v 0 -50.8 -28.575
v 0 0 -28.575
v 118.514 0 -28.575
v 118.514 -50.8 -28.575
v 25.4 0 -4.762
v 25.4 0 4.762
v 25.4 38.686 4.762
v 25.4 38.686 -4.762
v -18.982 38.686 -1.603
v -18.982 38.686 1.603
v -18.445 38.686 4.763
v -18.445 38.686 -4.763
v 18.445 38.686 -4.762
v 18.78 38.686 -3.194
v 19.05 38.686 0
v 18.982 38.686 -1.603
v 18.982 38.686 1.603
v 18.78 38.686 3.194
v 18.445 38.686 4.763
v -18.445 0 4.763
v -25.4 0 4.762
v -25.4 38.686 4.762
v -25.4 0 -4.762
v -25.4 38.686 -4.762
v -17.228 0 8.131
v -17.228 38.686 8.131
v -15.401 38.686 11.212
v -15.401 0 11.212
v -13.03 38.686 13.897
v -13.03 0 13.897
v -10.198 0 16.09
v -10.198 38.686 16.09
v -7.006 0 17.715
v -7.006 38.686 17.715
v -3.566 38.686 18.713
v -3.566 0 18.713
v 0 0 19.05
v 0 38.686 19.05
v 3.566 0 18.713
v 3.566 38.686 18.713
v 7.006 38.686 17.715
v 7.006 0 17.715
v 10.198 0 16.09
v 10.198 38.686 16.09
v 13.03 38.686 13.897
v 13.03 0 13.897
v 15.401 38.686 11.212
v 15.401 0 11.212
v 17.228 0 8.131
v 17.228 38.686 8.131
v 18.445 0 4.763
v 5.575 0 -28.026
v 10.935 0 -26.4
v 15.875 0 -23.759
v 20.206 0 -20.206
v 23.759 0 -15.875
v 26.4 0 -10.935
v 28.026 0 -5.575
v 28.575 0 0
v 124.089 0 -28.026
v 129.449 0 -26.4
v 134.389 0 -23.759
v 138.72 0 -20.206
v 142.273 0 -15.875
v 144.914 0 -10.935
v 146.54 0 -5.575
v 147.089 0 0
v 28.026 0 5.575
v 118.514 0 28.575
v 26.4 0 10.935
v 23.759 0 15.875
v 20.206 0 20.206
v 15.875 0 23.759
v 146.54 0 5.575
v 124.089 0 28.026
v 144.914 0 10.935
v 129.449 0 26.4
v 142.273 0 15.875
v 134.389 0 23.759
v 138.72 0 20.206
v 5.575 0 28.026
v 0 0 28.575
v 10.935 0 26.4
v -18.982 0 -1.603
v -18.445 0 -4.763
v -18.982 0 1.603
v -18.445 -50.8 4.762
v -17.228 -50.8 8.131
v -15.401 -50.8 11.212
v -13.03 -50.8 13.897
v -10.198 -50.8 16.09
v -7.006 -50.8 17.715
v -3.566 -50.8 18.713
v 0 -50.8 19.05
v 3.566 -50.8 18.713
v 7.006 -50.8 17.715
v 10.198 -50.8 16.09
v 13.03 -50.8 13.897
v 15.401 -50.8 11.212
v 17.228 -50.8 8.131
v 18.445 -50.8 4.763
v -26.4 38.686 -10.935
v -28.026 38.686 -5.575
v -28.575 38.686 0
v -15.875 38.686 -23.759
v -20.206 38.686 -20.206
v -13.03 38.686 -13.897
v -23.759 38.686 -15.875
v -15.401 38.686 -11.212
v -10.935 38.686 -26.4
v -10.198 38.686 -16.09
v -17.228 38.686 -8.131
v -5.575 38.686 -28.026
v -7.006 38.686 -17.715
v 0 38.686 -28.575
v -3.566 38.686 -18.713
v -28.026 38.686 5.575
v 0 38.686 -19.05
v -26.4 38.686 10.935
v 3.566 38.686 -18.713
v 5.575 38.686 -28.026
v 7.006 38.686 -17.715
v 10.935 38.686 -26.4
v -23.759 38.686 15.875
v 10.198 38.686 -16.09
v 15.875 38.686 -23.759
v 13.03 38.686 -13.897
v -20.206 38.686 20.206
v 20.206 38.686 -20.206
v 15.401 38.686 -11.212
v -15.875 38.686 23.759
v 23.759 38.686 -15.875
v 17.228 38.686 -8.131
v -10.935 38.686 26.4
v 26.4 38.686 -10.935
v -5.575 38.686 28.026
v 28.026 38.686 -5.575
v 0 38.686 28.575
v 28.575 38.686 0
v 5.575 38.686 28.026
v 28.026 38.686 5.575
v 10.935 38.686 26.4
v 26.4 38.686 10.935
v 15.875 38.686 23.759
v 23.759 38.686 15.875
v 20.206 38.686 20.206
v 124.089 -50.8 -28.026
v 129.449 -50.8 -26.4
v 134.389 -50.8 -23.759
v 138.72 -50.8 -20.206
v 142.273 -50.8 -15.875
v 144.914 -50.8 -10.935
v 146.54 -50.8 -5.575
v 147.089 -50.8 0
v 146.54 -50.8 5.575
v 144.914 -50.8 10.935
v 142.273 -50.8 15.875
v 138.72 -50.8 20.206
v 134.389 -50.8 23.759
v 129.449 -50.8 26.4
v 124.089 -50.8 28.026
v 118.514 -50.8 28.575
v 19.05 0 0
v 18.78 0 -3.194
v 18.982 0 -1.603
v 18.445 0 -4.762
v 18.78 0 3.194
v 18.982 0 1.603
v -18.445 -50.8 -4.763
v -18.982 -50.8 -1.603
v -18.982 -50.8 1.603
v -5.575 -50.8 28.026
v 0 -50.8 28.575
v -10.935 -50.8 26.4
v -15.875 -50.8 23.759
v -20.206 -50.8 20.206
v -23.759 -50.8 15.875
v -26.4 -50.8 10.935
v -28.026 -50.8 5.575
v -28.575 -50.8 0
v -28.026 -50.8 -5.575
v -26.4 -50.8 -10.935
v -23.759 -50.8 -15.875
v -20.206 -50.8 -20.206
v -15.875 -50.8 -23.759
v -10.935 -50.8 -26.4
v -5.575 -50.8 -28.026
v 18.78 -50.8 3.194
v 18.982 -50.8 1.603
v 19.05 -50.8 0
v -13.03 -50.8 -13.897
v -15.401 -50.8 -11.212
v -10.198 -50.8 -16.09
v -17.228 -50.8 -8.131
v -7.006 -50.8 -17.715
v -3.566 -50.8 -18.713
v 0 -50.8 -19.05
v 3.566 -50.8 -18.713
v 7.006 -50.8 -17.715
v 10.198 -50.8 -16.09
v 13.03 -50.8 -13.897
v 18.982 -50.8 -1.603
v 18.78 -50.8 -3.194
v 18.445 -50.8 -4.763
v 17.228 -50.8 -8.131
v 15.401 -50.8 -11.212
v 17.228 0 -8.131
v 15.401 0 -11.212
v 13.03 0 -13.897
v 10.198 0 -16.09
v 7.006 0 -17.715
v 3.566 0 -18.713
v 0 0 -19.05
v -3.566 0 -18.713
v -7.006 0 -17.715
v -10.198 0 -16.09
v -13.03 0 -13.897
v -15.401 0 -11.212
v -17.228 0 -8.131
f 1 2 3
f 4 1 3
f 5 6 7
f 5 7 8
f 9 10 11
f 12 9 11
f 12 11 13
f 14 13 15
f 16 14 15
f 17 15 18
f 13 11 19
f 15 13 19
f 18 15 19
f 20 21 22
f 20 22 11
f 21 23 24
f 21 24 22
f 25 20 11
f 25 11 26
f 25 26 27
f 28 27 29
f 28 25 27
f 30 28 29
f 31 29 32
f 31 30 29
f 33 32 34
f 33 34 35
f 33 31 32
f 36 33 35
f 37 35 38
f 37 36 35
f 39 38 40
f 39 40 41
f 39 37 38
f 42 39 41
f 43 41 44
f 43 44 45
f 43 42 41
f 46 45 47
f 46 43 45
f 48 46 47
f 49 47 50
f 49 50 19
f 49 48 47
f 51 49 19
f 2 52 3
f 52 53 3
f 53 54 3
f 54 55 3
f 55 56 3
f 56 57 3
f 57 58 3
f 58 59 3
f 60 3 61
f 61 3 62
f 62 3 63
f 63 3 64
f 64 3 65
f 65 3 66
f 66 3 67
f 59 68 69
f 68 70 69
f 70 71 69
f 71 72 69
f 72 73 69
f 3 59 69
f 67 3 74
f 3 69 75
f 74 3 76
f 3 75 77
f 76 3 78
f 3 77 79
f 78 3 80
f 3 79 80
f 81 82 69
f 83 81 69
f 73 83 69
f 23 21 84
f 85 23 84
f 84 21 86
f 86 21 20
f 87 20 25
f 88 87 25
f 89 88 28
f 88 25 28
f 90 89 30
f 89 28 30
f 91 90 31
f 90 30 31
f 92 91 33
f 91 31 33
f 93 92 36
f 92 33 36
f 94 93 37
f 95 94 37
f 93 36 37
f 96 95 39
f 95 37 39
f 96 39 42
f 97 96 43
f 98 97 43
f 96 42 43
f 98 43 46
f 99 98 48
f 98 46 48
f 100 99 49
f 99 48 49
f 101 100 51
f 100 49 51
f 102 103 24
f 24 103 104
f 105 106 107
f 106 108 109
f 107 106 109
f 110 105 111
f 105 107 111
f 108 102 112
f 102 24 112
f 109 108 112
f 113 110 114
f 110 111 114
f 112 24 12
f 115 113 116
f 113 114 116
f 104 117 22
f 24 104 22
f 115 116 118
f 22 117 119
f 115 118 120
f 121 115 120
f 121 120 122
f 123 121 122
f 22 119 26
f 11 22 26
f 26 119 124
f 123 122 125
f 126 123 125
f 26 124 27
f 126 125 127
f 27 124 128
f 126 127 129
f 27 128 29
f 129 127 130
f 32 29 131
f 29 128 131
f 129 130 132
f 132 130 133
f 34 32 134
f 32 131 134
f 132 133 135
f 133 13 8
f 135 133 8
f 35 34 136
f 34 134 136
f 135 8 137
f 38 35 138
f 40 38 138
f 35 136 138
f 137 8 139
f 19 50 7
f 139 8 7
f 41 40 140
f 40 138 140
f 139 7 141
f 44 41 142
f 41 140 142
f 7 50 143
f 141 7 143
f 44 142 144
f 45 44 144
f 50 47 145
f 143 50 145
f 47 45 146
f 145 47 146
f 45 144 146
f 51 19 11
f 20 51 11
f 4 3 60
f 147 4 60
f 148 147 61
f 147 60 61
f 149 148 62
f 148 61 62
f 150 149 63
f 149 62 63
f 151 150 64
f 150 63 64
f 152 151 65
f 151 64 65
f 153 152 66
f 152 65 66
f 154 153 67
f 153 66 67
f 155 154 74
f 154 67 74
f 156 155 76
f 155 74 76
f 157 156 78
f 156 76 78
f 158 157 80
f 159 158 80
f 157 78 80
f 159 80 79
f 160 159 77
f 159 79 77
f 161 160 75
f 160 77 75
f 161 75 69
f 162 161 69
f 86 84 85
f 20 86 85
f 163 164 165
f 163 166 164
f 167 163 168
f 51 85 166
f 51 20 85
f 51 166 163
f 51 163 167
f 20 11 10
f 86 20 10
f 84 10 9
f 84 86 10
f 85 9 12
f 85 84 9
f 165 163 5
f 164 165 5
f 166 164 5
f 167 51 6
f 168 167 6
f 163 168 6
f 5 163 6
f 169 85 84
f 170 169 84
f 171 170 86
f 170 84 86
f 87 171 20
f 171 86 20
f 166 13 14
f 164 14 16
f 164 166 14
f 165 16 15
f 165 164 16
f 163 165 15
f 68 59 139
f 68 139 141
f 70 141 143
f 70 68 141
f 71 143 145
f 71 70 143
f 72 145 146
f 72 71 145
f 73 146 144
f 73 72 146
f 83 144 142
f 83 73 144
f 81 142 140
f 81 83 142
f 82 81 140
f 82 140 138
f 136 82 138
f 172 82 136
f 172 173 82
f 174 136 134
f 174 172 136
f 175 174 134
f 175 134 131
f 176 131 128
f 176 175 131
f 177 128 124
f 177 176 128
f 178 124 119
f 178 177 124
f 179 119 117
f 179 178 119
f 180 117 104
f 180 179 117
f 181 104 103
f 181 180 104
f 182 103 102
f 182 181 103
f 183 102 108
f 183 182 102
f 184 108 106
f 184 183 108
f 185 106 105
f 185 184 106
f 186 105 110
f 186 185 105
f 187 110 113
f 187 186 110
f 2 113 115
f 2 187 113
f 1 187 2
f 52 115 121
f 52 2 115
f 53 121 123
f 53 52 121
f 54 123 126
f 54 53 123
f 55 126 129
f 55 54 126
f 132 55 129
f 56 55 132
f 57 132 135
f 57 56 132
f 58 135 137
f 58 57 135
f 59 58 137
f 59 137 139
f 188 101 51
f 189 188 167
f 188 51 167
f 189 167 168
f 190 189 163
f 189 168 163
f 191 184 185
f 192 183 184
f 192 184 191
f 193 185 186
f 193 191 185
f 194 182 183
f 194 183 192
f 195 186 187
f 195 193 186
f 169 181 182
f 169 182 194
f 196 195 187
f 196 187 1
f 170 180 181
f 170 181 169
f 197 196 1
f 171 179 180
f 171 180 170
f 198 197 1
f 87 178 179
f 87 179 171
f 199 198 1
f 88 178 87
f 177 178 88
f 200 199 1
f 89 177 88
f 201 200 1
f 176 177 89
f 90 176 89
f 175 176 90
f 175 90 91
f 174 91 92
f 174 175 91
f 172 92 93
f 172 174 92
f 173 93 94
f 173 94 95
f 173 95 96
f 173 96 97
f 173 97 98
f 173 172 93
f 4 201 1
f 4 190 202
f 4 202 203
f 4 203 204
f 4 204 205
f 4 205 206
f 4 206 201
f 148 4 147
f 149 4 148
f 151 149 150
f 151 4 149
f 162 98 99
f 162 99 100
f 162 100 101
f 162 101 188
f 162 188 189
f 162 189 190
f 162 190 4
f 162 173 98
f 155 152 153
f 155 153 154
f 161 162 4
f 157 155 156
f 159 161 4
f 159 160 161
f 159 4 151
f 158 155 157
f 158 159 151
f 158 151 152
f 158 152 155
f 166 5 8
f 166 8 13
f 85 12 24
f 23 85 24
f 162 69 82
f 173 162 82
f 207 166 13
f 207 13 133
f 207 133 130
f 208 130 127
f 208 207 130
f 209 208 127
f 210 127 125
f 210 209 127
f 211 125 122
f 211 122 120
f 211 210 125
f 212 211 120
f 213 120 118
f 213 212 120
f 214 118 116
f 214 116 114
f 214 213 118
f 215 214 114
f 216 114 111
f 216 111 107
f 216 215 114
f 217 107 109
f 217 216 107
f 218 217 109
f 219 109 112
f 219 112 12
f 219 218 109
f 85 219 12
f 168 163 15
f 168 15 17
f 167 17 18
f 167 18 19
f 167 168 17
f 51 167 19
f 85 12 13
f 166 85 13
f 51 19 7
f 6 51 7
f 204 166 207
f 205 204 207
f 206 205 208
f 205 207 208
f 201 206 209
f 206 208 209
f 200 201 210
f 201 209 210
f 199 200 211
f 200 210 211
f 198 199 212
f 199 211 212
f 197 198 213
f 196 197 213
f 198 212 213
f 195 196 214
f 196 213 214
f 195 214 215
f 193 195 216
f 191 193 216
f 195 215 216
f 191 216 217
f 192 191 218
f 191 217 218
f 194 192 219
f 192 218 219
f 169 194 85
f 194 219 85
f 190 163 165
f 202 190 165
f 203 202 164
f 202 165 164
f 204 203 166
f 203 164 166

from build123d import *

# Parameters (mm, degrees)
F0_R     = 19.05
F1_DEPTH = 50.8
F2_DEPTH = 38.6862


with BuildPart() as f1:
    # F0 (on Front) → F1 (new body)
    with BuildSketch(Plane.XZ):
        with BuildLine():
            ThreePointArc((0, 28.575), (20.2055762724, 20.2055762724), (28.575, 0))
            ThreePointArc((28.575, 0), (20.2055762724, -20.2055762724), (0, -28.575))
            Line((0, -28.575), (118.5139659176, -28.575))
            ThreePointArc((118.5139659176, -28.575), (89.9389659176, 0), (118.5139659176, 28.575))
            Line((118.5139659176, 28.575), (0, 28.575))
        make_face()
        with BuildLine():
            ThreePointArc((147.0889659176, 0), (138.71954219, 20.2055762724), (118.5139659176, 28.575))
            ThreePointArc((118.5139659176, 28.575), (89.9389659176, 0), (118.5139659176, -28.575))
            ThreePointArc((118.5139659176, -28.575), (138.71954219, -20.2055762724), (147.0889659176, 0))
        make_face()
        with Locations((118.5139659176, 0)):
            Circle(F0_R, mode=Mode.SUBTRACT)
        with BuildLine():
            ThreePointArc((0, -28.575), (20.2055762724, -20.2055762724), (28.575, 0))
            ThreePointArc((28.575, 0), (20.2055762724, 20.2055762724), (0, 28.575))
            ThreePointArc((0, 28.575), (-28.575, 0), (0, -28.575))
        make_face()
        with BuildLine():
            ThreePointArc((-18.4450831863, 4.7625), (0, 19.05), (18.4450831863, 4.7625))
            Line((18.4450831863, 4.7625), (25.4, 4.7625))
            Line((25.4, 4.7625), (25.4, -4.7625))
            Line((25.4, -4.7625), (18.4450831863, -4.7625))
            ThreePointArc((18.4450831863, -4.7625), (0, -19.05), (-18.4450831863, -4.7625))
            Line((-18.4450831863, -4.7625), (-25.4, -4.7625))
            Line((-25.4, -4.7625), (-25.4, 4.7625))
            Line((-25.4, 4.7625), (-18.4450831863, 4.7625))
        make_face(mode=Mode.SUBTRACT)
        with Locations((118.5139659176, 0)):
            Circle(F0_R)
        with BuildLine():
            ThreePointArc((-18.4450831863, -4.7625), (-19.05, 0), (-18.4450831863, 4.7625))
            Line((-18.4450831863, 4.7625), (-25.4, 4.7625))
            Line((-25.4, 4.7625), (-25.4, -4.7625))
            Line((-25.4, -4.7625), (-18.4450831863, -4.7625))
        make_face()
        with BuildLine():
            ThreePointArc((18.4450831863, 4.7625), (18.8981657139, 2.4003817718), (19.05, 0))
            ThreePointArc((19.05, 0), (18.8981657139, -2.4003817718), (18.4450831863, -4.7625))
            Line((18.4450831863, -4.7625), (25.4, -4.7625))
            Line((25.4, -4.7625), (25.4, 4.7625))
            Line((25.4, 4.7625), (18.4450831863, 4.7625))
        make_face()
    extrude(amount=F1_DEPTH)

    # F0 (on Front) → F2 (join)
    with BuildSketch(Plane.XZ):
        with BuildLine():
            ThreePointArc((0, -28.575), (20.2055762724, -20.2055762724), (28.575, 0))
            ThreePointArc((28.575, 0), (20.2055762724, 20.2055762724), (0, 28.575))
            ThreePointArc((0, 28.575), (-28.575, 0), (0, -28.575))
        make_face()
        with BuildLine():
            ThreePointArc((-18.4450831863, 4.7625), (0, 19.05), (18.4450831863, 4.7625))
            Line((18.4450831863, 4.7625), (25.4, 4.7625))
            Line((25.4, 4.7625), (25.4, -4.7625))
            Line((25.4, -4.7625), (18.4450831863, -4.7625))
            ThreePointArc((18.4450831863, -4.7625), (0, -19.05), (-18.4450831863, -4.7625))
            Line((-18.4450831863, -4.7625), (-25.4, -4.7625))
            Line((-25.4, -4.7625), (-25.4, 4.7625))
            Line((-25.4, 4.7625), (-18.4450831863, 4.7625))
        make_face(mode=Mode.SUBTRACT)
        with BuildLine():
            ThreePointArc((18.4450831863, -4.7625), (18.8981657139, -2.4003817718), (19.05, 0))
            ThreePointArc((19.05, 0), (18.8981657139, 2.4003817718), (18.4450831863, 4.7625))
            Line((18.4450831863, 4.7625), (-18.4450831863, 4.7625))
            ThreePointArc((-18.4450831863, 4.7625), (-19.05, 0), (-18.4450831863, -4.7625))
            Line((-18.4450831863, -4.7625), (18.4450831863, -4.7625))
        make_face()
    extrude(amount=-F2_DEPTH)


solid = f1.part
